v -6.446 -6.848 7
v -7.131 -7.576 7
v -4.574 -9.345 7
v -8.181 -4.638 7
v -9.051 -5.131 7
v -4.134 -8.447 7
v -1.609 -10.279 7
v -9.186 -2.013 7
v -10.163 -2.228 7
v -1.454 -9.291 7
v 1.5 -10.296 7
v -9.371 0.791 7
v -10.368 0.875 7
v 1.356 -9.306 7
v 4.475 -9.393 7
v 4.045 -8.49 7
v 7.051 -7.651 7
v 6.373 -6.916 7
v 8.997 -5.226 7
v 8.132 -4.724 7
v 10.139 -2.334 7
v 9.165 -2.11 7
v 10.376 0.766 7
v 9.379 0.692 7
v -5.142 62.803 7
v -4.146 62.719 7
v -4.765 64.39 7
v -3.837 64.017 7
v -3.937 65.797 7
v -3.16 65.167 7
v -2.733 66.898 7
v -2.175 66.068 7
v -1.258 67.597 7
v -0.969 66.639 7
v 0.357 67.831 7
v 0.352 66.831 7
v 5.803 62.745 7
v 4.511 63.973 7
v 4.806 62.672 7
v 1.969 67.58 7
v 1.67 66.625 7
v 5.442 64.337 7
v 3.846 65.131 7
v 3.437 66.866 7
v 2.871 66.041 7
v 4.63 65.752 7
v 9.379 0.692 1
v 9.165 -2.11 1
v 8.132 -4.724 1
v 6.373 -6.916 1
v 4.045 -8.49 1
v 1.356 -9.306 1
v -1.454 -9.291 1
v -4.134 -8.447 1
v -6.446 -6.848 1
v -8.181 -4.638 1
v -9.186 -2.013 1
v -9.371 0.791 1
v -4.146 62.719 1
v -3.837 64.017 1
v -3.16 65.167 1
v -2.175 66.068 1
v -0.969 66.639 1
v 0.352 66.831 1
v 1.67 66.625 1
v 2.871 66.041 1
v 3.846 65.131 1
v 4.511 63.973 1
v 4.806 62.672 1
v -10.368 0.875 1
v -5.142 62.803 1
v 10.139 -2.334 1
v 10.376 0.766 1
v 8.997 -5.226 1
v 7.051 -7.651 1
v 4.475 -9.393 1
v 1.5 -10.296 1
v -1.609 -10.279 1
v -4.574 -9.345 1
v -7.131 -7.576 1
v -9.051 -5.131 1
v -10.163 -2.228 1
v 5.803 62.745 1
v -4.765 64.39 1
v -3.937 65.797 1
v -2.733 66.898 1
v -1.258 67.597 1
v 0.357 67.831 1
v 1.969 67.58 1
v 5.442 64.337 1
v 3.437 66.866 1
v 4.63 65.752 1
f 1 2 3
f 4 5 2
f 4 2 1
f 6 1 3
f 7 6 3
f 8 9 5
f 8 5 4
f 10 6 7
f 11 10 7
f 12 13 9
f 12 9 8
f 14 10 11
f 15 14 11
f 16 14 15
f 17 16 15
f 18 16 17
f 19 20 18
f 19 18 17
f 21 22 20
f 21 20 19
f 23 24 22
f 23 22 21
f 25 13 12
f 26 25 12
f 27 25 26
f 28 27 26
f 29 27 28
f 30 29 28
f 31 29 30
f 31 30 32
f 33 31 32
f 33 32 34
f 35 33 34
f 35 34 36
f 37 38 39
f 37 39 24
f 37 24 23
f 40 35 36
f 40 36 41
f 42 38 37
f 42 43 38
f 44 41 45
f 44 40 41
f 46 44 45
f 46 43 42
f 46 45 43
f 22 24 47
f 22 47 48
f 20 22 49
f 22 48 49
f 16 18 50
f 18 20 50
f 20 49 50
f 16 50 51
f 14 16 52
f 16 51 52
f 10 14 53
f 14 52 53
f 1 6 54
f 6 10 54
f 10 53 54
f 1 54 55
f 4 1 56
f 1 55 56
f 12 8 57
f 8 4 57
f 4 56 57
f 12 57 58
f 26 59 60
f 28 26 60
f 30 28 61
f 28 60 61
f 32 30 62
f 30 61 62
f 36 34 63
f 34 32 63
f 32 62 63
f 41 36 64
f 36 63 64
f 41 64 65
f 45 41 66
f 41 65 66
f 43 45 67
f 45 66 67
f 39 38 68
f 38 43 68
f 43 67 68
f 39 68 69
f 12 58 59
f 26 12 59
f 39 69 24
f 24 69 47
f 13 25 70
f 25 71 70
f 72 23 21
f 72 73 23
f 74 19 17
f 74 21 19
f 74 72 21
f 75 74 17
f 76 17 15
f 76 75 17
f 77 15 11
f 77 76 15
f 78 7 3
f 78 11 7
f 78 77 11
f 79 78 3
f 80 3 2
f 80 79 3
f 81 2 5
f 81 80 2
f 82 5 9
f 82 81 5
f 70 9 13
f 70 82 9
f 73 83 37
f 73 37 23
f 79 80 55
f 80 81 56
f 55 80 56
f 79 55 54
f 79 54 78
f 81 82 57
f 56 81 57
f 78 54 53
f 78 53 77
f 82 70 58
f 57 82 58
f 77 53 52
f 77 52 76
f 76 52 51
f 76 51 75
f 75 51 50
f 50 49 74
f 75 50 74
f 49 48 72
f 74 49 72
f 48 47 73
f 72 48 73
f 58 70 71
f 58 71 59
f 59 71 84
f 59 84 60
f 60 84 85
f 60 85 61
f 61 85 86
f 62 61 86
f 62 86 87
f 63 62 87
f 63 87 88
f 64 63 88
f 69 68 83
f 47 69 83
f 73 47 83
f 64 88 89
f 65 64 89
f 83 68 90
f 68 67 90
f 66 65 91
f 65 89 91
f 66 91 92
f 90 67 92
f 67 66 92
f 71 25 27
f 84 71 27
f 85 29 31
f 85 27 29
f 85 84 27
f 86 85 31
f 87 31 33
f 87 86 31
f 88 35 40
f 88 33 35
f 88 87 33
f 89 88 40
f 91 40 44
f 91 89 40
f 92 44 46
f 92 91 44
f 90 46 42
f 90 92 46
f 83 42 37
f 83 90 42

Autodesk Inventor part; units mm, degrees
ref_plane "YZ Plane" through (0, 0, 0) normal (1, 0, 0) x (0, 1, 0)
ref_plane "XZ Plane" through (0, 0, 0) normal (0, 1, 0) x (-1, 0, 0)
ref_plane "Work Plane1" through (0, 0, 1) normal (0, 0, 1) x (1, 0, 0)
sketch "Sketch1" plane through (0, 0, 1) normal (0, 0, 1) x (1, 0, 0)
  circle A0 centre (0, 0) radius 10.7044 projected
  circle A1 centre (0.328, 62.3411) radius 5.7897 projected
  arc A2 (5.8028, 62.7451) -> (-5.1423, 62.8026) centre (0.328, 62.3411) ccw
  arc A3 (-10.3676, 0.8748) -> (10.3762, 0.7656) centre (0, 0) ccw
  line L0 (-5.1423, 62.8026) -> (-10.3676, 0.8748)
  line L1 (5.8028, 62.7451) -> (10.3762, 0.7656)
  arc A4 (-5.1423, 62.8026) -> (5.8028, 62.7451) centre (0.328, 62.3411) ccw construction
  arc A5 (10.3762, 0.7656) -> (-10.3676, 0.8748) centre (0, 0) ccw construction
  line L2 (-9.3711, 0.7907) -> (-4.1458, 62.7186)
  arc A6 (4.8055, 62.6715) -> (-4.1458, 62.7186) centre (0.328, 62.3411) ccw
  line L3 (4.8055, 62.6715) -> (9.3789, 0.6921)
  arc A7 (-9.3711, 0.7907) -> (9.3789, 0.6921) centre (0, 0) ccw
  point P0 (0, 0)
  dimension "d1" = 0.3
  dimension "d2" = 0.3
  dimension "d3" = 1
extrude "Extrusion1" add sketch "Sketch1" along normal blind 6 contours L1 A3 L0 A0 L2 A7 L3 | A0 L3 A1 L1 | L0 A1 L2 A0 | A1 L3 A6 L2 L0 A2 L1
properties part number "Belt" material "Rubber"
